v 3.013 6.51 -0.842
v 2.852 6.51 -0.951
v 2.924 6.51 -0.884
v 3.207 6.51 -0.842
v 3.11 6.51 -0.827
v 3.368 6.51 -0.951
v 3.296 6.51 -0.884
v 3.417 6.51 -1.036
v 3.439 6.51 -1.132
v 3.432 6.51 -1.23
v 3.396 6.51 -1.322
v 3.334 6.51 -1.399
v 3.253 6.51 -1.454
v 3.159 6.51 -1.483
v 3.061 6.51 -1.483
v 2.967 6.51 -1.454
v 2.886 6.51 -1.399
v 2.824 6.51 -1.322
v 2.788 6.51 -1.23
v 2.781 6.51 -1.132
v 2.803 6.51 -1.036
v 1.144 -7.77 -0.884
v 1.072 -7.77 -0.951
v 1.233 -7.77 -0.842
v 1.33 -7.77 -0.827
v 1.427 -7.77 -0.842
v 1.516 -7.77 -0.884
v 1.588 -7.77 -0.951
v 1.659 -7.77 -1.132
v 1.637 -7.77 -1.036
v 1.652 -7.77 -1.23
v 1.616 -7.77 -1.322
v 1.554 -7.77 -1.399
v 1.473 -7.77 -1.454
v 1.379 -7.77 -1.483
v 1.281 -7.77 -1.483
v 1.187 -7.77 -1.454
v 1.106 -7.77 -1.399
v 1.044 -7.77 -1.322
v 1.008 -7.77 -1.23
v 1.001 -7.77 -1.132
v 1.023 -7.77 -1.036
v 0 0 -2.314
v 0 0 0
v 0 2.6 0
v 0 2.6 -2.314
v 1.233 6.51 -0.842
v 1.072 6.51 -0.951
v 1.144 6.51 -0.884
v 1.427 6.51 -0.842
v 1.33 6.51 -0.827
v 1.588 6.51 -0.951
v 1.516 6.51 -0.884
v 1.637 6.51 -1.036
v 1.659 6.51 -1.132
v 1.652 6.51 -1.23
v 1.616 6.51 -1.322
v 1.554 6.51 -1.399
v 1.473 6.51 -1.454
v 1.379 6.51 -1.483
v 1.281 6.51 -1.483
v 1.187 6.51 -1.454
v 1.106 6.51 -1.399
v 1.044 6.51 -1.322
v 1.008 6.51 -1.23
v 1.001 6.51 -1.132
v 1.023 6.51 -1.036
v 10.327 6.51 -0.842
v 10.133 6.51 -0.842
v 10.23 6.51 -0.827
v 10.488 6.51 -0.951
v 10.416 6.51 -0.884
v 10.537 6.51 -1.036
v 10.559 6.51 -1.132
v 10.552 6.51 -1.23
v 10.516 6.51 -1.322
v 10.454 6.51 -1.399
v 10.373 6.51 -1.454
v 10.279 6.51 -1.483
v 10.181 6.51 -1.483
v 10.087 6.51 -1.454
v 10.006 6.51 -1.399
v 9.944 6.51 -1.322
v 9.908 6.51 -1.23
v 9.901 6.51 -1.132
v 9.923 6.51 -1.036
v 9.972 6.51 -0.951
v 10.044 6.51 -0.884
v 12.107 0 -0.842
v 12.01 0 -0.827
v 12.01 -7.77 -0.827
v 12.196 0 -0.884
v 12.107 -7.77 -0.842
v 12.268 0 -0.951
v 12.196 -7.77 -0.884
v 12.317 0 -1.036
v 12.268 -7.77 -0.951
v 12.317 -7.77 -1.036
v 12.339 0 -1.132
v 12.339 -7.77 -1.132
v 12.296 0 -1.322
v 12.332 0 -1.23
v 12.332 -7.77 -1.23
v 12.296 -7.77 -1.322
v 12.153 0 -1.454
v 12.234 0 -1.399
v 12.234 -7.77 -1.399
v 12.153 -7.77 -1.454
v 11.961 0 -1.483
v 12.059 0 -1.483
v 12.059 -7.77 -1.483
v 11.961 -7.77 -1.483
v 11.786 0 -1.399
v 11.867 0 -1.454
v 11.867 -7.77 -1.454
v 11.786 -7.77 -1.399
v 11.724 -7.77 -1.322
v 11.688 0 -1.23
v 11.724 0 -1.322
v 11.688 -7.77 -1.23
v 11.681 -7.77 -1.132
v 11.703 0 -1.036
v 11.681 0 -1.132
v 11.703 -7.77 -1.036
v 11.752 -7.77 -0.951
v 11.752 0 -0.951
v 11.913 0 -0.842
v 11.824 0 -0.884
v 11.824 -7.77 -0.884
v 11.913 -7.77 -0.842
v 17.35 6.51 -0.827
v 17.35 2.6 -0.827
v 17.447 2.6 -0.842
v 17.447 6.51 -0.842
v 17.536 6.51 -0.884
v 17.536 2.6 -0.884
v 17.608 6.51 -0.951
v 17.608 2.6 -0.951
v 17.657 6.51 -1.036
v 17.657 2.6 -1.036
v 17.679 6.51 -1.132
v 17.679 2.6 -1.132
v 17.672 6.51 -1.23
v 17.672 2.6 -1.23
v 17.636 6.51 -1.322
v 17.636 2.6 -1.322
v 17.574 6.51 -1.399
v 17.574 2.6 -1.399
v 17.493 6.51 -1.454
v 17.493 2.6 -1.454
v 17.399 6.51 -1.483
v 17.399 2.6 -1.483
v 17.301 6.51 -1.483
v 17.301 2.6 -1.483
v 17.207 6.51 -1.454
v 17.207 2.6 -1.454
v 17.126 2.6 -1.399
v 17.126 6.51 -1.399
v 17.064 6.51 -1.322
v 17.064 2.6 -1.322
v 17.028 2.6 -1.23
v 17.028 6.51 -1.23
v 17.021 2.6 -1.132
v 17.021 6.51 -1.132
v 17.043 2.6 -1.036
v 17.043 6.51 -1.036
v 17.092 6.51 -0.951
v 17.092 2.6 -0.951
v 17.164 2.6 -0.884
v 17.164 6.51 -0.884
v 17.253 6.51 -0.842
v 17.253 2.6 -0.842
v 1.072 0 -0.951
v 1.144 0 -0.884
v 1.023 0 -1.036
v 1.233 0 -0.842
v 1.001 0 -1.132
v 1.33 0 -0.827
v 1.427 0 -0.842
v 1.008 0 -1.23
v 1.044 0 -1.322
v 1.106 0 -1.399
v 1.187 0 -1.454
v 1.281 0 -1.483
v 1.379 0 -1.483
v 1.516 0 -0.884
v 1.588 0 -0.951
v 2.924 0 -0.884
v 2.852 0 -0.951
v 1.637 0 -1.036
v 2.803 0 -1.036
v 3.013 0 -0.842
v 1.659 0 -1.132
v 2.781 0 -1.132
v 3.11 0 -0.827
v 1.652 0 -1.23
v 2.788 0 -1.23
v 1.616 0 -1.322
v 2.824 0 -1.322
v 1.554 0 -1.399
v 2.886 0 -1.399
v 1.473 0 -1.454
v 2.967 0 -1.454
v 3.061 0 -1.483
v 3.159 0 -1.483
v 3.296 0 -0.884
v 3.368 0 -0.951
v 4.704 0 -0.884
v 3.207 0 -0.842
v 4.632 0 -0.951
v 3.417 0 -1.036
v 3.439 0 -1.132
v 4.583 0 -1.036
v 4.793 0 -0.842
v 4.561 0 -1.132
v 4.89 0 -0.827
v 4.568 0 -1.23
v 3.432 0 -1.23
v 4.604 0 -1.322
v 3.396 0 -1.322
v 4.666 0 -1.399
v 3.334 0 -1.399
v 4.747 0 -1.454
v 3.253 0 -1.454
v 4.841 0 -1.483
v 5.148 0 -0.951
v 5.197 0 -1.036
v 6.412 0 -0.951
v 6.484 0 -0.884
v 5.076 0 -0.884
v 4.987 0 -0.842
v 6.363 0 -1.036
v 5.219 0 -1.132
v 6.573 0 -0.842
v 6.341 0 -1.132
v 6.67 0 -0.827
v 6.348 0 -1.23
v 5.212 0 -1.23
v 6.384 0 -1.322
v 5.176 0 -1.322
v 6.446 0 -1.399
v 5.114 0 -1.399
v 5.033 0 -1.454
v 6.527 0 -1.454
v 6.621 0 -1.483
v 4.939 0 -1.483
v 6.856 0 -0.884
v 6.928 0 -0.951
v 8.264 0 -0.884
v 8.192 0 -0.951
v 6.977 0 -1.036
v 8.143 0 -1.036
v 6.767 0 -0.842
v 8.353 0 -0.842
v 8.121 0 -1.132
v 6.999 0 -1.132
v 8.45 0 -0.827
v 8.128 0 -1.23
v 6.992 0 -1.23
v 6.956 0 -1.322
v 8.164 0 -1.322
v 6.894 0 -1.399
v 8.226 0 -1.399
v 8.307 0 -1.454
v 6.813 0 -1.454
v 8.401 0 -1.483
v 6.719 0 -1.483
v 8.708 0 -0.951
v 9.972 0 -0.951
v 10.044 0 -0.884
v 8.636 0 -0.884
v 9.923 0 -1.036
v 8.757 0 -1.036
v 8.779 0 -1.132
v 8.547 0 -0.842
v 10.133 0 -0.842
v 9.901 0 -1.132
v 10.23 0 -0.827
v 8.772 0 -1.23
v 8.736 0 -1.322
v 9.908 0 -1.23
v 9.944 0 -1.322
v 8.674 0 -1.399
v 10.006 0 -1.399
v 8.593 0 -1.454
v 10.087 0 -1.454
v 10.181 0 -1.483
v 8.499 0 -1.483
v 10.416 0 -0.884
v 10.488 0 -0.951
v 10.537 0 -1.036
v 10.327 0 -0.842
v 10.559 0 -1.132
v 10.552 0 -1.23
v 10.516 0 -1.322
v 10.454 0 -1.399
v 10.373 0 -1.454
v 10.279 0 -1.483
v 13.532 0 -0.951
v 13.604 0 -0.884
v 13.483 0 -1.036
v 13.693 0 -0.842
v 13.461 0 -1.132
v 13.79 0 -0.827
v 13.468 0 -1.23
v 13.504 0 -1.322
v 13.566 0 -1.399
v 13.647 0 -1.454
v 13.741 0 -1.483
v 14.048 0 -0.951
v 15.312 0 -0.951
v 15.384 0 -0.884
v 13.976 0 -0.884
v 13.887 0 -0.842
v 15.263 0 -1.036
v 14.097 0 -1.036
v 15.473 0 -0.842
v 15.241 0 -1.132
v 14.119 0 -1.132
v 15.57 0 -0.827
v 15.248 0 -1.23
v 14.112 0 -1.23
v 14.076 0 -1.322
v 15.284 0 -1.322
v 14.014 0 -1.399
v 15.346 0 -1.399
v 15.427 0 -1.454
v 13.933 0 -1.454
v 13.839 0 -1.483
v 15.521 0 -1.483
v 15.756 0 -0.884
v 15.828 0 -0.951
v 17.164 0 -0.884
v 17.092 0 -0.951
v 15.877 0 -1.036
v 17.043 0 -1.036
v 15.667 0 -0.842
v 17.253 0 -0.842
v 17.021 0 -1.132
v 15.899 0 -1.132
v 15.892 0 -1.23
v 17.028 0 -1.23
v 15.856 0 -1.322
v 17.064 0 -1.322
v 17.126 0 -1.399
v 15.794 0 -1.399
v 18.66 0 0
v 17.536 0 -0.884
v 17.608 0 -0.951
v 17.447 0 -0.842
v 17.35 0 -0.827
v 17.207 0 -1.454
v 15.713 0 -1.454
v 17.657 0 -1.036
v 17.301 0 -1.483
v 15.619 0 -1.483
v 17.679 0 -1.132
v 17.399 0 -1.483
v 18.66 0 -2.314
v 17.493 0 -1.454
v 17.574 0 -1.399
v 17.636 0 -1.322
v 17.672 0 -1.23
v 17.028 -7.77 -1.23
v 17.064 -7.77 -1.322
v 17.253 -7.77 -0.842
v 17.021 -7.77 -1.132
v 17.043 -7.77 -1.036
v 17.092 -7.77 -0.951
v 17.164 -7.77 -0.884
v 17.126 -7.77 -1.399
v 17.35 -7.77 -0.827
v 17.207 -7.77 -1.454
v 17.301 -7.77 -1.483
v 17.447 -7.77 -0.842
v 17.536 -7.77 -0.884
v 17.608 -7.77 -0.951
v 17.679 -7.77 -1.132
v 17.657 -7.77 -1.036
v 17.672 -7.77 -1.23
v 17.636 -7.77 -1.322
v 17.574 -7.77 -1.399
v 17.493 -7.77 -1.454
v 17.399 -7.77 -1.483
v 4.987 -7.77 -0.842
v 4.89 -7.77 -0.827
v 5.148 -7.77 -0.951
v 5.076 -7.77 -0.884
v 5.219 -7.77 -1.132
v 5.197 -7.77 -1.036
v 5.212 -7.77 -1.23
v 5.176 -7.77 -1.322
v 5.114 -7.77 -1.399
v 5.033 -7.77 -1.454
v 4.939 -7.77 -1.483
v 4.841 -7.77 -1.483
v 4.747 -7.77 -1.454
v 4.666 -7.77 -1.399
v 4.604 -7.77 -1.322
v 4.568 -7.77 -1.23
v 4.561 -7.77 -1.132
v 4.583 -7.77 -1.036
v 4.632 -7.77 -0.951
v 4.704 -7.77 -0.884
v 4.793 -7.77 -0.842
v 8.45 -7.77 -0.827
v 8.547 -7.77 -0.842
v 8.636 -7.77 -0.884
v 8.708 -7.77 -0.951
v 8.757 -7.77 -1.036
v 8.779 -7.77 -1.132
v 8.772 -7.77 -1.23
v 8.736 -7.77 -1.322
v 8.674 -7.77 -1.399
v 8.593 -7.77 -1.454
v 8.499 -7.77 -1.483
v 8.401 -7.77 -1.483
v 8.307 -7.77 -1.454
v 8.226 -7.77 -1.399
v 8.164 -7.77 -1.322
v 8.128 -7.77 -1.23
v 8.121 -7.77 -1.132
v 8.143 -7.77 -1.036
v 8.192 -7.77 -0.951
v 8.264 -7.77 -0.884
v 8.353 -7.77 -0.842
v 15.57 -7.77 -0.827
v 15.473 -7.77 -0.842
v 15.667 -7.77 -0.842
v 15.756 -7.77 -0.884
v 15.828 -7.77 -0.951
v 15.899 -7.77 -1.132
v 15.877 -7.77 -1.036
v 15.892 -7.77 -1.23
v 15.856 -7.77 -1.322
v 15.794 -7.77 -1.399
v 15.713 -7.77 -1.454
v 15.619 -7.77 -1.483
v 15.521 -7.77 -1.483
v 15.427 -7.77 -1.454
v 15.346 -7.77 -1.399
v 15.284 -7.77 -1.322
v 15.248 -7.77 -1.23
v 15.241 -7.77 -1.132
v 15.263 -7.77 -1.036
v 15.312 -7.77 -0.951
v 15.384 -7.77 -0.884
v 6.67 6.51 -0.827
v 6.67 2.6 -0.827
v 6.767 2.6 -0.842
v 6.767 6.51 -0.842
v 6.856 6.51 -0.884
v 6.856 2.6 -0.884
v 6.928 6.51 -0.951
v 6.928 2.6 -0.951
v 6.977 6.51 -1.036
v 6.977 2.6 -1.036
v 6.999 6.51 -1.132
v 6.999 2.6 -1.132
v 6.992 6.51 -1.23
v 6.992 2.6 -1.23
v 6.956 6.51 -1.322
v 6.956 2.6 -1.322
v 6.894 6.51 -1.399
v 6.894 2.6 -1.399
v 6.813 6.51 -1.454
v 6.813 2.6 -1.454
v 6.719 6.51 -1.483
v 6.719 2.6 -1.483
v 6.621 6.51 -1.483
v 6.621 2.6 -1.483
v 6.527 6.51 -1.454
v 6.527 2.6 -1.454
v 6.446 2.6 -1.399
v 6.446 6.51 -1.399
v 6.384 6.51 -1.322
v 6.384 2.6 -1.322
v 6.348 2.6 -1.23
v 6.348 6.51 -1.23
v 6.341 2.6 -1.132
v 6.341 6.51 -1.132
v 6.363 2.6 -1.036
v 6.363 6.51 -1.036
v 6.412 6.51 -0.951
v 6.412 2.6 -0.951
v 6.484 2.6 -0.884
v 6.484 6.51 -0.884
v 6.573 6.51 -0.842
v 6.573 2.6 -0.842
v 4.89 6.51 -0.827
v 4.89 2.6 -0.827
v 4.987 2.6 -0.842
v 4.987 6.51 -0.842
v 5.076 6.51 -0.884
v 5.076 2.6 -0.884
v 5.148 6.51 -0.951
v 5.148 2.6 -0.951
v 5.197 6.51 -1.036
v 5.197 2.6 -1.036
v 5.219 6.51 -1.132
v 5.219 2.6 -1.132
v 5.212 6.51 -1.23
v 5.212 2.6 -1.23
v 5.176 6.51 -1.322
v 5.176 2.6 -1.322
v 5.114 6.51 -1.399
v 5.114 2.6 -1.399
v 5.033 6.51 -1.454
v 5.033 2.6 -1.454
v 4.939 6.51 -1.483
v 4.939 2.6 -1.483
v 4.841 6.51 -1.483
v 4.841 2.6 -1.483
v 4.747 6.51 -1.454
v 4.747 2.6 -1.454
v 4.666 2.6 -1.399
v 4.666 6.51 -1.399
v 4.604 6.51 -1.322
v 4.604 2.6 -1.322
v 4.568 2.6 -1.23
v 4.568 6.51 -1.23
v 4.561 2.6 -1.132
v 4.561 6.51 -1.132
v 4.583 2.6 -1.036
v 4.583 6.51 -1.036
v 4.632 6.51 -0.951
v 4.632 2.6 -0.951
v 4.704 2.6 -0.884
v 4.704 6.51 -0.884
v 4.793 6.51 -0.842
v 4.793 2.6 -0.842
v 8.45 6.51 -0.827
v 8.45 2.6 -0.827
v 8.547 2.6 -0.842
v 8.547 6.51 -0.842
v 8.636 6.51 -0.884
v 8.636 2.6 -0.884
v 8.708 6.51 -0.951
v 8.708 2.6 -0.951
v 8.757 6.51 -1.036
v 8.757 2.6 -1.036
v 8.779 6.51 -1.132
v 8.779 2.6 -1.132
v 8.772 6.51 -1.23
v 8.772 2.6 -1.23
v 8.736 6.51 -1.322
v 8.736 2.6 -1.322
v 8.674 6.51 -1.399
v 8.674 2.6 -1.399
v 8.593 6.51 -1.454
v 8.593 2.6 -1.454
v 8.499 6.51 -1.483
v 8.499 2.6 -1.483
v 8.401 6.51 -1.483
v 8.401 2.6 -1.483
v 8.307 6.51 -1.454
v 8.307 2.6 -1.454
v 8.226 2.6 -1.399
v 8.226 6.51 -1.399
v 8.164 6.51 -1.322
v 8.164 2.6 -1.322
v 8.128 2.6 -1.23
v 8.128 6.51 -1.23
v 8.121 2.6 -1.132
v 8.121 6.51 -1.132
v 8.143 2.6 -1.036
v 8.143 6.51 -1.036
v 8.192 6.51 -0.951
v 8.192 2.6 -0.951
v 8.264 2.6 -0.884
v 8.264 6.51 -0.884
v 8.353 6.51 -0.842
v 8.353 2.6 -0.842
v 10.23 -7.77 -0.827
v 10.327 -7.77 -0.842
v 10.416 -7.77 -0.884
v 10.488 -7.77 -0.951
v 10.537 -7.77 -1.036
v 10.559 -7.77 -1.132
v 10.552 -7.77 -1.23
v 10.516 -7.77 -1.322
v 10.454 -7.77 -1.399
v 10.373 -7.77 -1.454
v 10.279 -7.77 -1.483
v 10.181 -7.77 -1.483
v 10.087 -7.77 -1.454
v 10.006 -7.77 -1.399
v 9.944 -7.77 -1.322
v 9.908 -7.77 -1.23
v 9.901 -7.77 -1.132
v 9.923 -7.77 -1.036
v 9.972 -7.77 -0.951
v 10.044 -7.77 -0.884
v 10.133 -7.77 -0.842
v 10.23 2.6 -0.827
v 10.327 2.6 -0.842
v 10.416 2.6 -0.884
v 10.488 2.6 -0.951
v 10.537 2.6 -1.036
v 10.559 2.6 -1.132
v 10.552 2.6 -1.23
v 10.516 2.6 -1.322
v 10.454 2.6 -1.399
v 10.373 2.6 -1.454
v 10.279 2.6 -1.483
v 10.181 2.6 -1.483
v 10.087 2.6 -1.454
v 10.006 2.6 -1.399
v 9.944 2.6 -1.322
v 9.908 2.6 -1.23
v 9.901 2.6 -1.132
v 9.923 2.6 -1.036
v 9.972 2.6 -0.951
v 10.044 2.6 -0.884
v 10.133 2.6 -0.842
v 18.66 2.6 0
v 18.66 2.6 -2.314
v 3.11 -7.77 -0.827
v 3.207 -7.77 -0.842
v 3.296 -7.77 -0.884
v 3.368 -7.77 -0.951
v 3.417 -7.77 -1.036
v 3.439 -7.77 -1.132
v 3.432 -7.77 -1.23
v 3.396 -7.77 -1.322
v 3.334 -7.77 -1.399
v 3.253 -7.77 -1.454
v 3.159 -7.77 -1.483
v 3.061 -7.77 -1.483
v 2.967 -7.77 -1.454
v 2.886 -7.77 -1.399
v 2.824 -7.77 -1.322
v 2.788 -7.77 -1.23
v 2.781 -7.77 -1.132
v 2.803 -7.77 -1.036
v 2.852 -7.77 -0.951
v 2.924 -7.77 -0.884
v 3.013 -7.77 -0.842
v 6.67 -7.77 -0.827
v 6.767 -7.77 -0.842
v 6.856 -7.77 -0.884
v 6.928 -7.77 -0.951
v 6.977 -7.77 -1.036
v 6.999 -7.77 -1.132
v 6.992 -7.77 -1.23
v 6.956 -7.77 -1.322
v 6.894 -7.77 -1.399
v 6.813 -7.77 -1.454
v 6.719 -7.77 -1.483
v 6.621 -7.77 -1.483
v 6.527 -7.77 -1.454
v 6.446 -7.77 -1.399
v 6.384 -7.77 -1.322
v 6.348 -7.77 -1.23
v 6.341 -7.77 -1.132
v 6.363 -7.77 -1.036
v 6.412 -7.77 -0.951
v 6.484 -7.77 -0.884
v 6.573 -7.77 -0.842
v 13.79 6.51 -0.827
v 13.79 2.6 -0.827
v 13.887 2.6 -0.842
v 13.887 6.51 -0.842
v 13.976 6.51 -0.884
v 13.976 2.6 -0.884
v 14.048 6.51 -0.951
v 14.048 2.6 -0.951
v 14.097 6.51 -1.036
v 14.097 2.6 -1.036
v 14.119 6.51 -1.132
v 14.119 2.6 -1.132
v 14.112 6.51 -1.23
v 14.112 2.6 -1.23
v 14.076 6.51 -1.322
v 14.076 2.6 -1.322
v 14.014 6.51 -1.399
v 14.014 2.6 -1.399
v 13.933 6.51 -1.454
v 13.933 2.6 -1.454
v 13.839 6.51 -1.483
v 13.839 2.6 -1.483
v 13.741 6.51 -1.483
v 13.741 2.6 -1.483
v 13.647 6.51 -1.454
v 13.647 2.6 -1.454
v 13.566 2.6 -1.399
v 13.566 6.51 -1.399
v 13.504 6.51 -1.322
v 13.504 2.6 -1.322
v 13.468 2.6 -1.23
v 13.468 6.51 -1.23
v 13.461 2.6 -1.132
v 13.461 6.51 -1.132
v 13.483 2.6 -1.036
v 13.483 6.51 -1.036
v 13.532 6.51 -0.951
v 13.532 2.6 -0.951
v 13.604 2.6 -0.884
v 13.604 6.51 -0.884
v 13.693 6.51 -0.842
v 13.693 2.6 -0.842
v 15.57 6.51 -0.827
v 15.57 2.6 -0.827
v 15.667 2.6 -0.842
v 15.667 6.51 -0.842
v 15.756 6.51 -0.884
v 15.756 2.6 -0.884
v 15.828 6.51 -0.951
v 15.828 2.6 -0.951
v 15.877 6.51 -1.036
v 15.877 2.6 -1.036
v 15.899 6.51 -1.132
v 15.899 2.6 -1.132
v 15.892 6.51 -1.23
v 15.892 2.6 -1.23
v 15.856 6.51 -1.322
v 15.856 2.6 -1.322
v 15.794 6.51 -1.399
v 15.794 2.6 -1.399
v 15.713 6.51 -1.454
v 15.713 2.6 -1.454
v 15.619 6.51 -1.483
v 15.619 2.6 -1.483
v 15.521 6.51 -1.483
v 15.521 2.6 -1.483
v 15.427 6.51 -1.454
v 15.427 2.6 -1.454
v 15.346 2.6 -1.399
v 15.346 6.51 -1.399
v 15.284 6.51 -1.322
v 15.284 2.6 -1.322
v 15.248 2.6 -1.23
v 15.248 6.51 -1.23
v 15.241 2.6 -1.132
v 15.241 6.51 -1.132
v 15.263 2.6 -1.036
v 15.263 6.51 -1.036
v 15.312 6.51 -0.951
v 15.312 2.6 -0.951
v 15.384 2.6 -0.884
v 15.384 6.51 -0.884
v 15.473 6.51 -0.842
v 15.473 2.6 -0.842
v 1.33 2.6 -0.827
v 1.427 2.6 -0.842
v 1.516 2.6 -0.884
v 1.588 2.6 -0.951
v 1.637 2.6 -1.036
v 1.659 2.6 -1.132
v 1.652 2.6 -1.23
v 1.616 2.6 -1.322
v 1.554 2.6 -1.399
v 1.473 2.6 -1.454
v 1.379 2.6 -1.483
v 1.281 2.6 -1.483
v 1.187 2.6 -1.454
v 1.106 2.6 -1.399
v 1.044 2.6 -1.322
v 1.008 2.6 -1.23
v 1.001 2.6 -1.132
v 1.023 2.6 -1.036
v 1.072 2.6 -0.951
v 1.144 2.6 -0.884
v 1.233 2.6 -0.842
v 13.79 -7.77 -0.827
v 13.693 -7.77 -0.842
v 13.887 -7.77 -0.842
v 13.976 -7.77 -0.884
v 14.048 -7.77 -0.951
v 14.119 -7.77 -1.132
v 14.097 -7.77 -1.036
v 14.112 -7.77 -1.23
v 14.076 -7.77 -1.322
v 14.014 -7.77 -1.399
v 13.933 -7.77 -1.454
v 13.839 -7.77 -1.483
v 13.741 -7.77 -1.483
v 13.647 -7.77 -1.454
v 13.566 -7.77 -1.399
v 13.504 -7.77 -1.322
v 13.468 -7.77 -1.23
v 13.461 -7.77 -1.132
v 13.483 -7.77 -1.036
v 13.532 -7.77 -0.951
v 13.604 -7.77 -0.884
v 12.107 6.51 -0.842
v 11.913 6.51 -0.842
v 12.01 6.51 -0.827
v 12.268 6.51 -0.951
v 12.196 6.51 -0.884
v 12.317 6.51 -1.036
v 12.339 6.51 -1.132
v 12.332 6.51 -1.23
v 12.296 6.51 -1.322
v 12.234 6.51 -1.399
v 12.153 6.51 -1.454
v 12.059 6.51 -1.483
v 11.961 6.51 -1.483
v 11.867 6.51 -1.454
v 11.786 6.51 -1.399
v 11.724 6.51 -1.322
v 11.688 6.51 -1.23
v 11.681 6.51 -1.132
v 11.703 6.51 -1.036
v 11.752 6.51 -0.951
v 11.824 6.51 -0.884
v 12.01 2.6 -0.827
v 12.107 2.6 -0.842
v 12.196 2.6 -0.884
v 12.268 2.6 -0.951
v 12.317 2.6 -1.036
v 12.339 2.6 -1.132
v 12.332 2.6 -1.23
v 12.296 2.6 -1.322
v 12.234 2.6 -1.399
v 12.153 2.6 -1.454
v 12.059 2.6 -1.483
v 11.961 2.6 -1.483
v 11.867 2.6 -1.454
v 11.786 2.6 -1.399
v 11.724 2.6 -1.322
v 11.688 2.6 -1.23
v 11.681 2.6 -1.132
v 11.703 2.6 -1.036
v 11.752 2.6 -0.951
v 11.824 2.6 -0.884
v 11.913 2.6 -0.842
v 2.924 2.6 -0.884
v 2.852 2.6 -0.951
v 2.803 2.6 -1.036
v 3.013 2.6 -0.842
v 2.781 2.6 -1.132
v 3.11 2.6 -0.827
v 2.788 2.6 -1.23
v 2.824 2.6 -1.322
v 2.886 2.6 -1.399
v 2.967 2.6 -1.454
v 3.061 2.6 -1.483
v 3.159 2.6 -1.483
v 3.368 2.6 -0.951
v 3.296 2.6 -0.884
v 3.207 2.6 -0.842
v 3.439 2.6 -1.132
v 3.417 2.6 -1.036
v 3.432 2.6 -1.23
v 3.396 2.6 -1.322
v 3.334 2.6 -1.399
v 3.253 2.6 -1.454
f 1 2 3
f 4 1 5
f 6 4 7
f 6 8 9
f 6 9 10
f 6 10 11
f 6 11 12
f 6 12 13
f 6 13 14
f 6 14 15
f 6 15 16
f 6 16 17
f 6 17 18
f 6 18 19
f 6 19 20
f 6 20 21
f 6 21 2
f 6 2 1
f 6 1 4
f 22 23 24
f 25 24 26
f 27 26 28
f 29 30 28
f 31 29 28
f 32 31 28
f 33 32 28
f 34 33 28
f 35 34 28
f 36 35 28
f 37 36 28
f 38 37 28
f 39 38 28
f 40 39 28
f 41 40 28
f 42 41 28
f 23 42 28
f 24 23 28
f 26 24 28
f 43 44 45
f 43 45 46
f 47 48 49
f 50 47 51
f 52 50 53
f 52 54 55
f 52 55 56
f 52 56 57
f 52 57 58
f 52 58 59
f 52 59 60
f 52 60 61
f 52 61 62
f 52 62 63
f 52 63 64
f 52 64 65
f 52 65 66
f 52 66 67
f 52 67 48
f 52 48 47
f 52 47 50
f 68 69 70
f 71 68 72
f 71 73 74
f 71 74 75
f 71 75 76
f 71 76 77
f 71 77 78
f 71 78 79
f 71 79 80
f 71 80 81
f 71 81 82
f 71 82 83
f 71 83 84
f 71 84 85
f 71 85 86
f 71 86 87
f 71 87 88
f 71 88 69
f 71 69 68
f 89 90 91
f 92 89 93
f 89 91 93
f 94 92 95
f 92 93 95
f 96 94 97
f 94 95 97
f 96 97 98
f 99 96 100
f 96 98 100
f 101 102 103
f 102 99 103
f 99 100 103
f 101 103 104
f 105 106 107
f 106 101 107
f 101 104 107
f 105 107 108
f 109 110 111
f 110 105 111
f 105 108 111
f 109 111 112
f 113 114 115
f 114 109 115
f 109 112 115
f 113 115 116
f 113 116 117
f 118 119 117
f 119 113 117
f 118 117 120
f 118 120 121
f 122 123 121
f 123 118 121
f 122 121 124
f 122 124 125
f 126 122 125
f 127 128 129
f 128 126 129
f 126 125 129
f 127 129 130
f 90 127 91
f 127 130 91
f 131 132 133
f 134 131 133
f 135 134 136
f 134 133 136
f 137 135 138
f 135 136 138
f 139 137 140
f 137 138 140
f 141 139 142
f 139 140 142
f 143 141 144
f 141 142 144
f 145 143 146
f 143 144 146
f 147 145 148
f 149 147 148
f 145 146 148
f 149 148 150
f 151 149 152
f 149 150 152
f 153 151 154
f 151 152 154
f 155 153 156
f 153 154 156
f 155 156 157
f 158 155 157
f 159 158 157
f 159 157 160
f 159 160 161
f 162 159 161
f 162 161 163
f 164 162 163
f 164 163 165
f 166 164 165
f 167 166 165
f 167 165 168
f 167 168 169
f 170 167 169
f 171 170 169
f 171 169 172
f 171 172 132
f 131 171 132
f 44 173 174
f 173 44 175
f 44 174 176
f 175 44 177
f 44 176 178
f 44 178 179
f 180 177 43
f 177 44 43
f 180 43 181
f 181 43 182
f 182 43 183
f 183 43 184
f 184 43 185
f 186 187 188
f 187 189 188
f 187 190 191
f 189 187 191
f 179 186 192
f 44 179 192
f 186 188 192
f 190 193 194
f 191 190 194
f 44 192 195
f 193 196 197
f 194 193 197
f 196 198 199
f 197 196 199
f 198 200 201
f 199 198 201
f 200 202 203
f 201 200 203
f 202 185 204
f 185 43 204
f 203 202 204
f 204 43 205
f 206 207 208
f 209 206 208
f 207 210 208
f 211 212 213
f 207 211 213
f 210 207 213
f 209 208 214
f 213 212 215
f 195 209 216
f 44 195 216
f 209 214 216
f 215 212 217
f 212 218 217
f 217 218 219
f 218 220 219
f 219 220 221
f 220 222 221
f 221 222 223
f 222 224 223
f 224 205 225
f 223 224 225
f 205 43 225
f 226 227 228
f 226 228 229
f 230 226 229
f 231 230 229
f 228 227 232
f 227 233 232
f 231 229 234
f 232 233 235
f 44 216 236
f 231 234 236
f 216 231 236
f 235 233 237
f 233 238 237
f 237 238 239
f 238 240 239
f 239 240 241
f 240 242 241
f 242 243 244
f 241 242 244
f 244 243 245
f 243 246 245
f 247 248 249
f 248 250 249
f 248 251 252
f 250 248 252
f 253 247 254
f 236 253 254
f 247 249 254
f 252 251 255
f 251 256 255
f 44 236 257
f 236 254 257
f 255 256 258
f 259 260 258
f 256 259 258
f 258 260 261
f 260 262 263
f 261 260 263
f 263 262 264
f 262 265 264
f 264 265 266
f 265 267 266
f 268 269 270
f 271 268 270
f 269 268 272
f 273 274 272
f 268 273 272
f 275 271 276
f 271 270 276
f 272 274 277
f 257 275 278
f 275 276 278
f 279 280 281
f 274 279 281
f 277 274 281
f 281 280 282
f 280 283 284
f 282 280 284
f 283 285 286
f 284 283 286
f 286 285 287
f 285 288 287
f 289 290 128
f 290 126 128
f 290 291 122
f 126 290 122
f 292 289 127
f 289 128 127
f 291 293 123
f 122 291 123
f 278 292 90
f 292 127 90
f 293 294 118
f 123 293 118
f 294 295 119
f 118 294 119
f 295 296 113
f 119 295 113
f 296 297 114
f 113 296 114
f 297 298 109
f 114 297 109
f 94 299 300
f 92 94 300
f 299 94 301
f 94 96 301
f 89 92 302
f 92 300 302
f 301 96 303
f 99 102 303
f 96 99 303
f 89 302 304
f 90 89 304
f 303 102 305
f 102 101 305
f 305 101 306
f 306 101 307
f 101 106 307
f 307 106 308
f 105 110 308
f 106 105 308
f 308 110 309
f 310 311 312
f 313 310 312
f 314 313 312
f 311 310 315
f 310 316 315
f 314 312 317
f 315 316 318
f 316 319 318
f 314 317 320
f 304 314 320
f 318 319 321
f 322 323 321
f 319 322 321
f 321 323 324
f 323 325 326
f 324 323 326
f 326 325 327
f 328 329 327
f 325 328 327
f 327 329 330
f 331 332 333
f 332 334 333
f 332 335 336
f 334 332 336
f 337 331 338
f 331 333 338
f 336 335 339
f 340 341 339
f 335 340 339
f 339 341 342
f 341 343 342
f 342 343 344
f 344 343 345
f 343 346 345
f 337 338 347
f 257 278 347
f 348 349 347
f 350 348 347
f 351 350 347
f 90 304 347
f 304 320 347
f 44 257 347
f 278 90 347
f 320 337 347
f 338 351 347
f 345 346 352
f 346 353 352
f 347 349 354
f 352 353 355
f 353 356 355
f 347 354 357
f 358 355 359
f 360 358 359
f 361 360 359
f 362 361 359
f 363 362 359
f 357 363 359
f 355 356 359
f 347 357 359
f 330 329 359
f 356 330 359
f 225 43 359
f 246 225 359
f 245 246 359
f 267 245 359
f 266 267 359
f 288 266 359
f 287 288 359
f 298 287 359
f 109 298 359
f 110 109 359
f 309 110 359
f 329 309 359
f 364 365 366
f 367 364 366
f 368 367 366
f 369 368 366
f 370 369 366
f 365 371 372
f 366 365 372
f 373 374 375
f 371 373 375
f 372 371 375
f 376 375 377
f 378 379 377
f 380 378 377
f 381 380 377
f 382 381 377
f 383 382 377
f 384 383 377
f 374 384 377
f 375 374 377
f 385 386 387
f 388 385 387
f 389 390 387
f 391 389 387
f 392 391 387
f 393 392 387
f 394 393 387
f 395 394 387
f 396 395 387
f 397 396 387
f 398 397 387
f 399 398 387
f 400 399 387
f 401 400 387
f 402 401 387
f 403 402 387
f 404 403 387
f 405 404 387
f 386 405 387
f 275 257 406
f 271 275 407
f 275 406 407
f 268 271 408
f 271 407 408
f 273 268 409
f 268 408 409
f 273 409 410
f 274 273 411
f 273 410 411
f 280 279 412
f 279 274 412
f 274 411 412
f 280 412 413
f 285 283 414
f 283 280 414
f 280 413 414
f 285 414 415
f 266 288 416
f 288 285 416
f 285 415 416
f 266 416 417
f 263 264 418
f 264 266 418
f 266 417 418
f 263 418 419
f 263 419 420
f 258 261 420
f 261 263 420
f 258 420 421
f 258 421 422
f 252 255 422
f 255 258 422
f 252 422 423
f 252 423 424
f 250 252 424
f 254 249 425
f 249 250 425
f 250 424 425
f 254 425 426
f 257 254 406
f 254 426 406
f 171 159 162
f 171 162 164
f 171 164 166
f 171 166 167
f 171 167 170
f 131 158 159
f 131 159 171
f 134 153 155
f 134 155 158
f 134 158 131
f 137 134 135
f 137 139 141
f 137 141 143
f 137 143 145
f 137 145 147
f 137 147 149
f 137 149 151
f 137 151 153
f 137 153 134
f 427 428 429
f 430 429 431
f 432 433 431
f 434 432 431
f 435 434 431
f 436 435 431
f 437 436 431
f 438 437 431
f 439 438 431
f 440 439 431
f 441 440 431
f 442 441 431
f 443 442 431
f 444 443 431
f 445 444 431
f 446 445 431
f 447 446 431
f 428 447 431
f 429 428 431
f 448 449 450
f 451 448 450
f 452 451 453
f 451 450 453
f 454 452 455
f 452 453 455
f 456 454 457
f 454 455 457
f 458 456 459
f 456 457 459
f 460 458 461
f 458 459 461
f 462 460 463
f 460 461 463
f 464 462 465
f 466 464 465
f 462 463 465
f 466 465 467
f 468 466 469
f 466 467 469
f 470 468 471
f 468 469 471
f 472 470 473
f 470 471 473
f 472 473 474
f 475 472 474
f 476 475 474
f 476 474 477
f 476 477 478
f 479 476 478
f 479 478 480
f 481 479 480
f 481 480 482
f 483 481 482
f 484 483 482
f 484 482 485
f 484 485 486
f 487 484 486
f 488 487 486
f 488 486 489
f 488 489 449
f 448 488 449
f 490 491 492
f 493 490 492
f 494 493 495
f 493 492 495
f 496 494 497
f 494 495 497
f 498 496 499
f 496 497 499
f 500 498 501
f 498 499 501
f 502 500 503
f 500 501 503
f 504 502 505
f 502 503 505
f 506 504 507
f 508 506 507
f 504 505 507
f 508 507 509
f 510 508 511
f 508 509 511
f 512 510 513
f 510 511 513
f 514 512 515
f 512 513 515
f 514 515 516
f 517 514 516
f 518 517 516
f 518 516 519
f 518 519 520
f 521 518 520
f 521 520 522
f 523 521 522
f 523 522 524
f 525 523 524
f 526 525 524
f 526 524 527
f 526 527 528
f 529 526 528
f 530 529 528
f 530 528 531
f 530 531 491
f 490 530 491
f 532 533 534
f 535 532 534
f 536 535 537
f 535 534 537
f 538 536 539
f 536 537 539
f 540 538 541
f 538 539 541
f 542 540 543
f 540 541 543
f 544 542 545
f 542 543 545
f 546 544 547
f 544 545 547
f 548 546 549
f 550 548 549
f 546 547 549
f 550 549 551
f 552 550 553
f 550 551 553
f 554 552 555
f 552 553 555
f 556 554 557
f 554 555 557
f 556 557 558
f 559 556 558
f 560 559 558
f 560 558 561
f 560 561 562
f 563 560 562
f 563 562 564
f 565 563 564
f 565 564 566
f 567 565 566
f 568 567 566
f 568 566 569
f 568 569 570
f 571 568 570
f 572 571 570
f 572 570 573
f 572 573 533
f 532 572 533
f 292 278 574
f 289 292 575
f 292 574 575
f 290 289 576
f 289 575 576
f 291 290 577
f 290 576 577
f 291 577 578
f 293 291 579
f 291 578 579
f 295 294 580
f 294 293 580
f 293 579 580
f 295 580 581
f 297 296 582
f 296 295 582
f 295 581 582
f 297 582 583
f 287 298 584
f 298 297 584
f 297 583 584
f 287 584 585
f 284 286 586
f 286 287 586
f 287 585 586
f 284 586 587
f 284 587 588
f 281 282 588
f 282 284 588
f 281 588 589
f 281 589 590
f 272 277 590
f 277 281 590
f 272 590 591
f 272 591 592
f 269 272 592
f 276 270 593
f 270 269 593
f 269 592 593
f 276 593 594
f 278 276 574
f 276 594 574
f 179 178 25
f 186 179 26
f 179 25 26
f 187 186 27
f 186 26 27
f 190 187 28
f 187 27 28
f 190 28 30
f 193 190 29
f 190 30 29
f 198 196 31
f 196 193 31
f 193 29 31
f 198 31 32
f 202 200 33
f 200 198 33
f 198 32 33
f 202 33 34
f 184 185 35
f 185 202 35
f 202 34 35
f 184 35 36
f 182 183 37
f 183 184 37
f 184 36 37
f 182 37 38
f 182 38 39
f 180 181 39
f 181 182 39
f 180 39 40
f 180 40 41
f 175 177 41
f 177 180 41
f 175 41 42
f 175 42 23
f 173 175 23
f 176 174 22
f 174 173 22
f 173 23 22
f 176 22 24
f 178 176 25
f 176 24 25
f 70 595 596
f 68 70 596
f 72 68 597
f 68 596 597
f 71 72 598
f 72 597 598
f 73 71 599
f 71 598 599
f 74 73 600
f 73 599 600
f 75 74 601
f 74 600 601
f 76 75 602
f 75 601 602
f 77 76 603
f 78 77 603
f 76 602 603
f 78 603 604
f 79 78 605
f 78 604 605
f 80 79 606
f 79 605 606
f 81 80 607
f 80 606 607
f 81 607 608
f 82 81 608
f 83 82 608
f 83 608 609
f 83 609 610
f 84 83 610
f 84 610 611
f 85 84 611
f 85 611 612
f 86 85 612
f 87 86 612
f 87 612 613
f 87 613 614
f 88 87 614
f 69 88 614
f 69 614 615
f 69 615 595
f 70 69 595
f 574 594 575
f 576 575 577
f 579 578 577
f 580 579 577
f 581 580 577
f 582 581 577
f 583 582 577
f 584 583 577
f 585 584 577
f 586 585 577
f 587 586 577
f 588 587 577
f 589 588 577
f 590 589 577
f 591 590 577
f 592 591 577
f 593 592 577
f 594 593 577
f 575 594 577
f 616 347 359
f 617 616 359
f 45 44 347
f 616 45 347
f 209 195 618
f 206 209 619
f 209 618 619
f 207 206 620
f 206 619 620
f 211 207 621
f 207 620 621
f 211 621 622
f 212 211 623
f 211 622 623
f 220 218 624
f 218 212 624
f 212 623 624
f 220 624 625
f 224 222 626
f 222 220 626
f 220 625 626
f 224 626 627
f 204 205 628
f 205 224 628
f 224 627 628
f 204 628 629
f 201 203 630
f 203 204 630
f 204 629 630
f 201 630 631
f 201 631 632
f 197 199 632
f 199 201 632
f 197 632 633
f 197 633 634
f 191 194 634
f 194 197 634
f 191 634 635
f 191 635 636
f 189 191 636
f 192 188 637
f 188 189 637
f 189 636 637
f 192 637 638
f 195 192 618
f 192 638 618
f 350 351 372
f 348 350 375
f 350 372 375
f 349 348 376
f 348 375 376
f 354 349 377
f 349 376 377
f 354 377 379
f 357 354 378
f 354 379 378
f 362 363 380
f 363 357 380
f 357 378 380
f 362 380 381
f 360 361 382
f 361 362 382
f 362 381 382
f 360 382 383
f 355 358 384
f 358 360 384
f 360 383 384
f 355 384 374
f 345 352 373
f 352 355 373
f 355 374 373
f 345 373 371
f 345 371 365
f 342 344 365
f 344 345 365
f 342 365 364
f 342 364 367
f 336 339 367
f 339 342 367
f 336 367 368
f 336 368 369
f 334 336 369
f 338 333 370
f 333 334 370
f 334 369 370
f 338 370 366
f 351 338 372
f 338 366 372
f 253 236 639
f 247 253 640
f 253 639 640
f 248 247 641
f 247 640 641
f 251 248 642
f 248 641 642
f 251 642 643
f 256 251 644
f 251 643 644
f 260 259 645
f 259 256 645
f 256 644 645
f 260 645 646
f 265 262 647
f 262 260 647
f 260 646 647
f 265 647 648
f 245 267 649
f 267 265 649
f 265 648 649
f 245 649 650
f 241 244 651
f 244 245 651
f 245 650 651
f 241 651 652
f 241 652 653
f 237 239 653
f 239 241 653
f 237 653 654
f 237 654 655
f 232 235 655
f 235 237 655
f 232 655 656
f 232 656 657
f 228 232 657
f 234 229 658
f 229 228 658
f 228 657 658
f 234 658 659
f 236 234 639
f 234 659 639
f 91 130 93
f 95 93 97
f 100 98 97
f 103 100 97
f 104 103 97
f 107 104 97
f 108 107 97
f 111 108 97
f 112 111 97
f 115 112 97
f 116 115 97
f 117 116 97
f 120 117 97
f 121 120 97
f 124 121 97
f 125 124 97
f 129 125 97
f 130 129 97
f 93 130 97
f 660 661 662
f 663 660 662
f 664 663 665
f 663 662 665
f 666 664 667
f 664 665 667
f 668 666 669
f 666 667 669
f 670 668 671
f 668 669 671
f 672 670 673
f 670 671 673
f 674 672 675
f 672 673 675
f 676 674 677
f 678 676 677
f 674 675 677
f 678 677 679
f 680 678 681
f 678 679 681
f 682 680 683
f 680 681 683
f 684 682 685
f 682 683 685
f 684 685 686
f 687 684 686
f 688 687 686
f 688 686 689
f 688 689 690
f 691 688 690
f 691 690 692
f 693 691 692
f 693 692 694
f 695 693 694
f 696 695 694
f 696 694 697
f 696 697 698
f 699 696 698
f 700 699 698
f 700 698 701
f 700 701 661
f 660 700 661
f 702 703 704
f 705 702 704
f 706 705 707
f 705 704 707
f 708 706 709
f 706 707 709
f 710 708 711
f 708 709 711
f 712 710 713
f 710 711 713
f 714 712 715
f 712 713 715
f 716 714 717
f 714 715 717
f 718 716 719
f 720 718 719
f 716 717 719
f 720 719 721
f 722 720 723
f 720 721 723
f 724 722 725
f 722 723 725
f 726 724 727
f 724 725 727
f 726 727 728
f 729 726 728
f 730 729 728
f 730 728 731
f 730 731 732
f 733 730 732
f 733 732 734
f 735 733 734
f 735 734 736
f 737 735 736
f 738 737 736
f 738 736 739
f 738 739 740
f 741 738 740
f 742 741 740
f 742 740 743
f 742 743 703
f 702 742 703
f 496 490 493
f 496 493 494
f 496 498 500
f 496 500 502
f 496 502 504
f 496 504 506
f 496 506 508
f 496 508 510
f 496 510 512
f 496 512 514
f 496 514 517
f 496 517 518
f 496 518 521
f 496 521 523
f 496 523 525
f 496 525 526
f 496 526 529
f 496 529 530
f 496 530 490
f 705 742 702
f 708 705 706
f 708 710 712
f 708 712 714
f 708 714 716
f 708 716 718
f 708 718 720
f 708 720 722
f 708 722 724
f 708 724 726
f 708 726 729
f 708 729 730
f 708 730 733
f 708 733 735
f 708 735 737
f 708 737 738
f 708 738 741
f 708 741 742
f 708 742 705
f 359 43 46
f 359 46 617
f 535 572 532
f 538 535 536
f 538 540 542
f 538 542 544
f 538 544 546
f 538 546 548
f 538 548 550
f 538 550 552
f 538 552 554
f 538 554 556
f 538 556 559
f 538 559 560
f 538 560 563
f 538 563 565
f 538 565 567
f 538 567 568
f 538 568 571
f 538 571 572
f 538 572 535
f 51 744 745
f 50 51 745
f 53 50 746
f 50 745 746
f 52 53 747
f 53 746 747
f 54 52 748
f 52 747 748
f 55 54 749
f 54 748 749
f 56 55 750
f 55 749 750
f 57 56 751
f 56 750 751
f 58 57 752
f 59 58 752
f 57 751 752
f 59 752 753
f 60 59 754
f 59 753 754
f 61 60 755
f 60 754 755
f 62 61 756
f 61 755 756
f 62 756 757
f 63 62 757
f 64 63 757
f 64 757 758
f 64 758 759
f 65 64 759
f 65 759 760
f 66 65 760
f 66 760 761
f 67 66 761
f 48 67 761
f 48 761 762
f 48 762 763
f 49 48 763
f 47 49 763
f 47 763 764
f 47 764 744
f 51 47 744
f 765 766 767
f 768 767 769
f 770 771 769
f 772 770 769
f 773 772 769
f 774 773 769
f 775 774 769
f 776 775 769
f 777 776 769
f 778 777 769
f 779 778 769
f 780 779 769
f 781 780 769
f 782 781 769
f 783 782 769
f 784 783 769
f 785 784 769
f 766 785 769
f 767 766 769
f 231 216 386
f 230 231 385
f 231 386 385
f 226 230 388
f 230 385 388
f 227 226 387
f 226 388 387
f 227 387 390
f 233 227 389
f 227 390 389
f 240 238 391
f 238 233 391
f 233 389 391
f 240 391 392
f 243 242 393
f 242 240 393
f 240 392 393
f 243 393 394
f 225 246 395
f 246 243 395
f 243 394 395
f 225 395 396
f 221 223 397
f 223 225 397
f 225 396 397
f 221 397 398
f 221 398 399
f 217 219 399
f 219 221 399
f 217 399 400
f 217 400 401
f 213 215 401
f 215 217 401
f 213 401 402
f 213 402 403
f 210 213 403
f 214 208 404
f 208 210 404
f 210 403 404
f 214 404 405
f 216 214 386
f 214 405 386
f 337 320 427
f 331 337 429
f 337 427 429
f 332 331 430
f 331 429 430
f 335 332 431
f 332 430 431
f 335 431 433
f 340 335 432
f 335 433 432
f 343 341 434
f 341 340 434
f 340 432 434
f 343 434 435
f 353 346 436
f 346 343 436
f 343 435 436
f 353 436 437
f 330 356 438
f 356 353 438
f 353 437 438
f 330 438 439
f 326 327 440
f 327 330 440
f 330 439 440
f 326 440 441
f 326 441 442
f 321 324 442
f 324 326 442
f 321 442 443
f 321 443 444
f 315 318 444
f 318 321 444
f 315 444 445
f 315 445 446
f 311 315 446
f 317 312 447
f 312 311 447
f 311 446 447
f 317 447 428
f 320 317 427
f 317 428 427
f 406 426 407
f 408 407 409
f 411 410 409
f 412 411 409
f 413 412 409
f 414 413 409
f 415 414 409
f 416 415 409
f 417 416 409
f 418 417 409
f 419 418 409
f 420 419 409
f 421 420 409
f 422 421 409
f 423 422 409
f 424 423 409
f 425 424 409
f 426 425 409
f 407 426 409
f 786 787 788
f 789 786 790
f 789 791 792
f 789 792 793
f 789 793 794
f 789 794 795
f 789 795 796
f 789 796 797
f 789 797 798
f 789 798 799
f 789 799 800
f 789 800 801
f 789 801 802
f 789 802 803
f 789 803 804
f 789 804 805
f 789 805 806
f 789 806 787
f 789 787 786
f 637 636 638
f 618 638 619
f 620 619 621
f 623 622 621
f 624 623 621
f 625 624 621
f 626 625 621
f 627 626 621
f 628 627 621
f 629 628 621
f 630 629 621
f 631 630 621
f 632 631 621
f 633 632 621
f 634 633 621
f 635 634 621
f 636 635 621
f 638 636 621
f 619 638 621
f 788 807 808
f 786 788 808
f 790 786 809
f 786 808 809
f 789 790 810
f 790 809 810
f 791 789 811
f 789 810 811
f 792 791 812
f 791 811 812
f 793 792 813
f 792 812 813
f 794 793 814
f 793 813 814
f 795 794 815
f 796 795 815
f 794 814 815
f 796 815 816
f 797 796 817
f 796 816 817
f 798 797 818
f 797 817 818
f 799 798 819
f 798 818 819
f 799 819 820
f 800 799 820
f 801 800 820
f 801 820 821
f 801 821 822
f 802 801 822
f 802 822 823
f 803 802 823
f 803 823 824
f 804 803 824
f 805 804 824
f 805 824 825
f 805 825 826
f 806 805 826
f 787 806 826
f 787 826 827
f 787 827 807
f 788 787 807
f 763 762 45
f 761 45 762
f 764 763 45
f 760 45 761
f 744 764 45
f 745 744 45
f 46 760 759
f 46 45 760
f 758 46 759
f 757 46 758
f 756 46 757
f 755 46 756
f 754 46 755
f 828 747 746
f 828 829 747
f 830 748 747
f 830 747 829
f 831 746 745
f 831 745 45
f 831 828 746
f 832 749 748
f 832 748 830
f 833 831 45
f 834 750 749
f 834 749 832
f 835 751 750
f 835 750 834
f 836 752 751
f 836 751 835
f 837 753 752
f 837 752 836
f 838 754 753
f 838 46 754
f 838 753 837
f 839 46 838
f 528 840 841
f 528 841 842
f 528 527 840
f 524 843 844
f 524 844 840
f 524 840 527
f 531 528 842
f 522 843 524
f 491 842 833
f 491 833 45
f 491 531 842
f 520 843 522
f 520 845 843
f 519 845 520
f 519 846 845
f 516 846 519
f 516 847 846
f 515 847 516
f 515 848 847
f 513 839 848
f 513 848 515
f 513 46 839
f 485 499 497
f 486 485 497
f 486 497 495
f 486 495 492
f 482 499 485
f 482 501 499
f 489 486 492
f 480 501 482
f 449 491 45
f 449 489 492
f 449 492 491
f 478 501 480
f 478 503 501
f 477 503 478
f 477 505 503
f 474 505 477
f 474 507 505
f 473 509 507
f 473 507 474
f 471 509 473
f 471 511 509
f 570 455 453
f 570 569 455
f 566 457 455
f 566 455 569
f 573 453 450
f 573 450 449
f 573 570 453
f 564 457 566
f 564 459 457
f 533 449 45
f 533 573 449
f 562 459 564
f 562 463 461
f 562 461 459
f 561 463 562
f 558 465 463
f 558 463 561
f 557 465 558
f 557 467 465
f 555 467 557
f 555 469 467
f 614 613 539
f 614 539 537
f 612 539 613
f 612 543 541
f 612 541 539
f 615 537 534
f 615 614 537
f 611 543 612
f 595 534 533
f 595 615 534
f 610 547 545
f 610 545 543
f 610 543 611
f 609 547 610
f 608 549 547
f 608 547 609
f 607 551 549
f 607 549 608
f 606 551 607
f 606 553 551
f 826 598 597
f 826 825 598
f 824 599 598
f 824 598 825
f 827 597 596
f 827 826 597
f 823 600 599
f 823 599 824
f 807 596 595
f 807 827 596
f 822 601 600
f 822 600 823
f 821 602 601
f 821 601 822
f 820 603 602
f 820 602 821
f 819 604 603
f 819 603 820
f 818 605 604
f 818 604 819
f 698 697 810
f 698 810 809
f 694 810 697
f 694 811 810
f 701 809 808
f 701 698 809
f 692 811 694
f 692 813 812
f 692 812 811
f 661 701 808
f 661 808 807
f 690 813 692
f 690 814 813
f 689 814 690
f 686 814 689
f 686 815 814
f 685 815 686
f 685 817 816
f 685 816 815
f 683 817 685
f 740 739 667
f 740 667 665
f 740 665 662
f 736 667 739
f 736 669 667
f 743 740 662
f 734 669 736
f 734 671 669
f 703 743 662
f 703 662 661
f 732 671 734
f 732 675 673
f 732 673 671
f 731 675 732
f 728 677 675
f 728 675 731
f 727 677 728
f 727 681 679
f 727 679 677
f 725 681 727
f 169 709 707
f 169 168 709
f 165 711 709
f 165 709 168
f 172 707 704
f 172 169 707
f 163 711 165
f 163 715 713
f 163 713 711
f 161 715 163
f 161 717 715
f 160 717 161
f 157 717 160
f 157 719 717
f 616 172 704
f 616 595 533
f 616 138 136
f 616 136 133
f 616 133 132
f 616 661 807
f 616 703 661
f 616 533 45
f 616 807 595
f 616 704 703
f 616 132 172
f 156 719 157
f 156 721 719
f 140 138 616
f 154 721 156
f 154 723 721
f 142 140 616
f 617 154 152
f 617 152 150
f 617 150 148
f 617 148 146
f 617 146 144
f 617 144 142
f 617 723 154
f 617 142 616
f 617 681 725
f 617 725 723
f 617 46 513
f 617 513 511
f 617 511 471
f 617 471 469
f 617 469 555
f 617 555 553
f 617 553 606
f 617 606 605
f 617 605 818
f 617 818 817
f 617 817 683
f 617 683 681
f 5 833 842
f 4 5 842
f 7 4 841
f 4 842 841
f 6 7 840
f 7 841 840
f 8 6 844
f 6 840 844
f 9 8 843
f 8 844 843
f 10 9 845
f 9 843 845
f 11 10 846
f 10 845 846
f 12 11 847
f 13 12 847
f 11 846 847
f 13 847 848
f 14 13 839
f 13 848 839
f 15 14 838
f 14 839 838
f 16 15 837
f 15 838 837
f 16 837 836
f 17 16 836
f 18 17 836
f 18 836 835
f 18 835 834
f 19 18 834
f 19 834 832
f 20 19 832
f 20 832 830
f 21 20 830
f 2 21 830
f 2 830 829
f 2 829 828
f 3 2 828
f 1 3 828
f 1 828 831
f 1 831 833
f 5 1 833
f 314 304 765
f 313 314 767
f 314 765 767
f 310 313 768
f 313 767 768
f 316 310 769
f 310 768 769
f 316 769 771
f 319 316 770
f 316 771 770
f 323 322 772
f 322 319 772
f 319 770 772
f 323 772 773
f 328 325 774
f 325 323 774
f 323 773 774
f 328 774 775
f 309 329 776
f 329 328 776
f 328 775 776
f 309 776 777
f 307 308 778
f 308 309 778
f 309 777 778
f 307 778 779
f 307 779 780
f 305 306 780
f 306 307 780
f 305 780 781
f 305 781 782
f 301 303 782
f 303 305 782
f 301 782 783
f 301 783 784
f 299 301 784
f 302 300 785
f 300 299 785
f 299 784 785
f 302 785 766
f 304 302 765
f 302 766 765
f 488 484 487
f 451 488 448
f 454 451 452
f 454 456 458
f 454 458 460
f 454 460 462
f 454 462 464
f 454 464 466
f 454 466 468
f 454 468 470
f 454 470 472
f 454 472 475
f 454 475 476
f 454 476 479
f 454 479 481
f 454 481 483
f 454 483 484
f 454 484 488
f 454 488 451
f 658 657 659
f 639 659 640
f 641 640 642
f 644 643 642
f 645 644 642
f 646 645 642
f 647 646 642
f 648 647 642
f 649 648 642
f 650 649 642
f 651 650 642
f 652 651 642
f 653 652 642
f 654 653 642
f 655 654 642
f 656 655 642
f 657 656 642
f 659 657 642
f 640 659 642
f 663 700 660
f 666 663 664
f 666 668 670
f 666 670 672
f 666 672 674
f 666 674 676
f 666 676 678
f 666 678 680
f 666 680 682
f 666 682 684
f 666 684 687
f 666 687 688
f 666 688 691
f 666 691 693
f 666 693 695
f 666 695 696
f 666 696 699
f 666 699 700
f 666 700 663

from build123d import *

# Parameters (mm, degrees)
SKETCH1_W                = 18.66
SKETCH1_H                = 2.314
BOSS_EXTRUDE1_DEPTH      = 2.6
BOSS_EXTRUDE2_DEPTH      = 3.91
BOSS_EXTRUDE2_DEPTH_BACK = 10.37
SKETCH2_R                = 0.33


with BuildPart() as part:
    # Sketch1 → Boss-Extrude1 (new body)
    with BuildSketch(Plane(origin=(0, 0, 0), x_dir=(1, 0, 0), z_dir=(0, 1, 0))):
        with Locations((9.33, 1.157)):
            Rectangle(SKETCH1_W, SKETCH1_H)
    extrude(amount=BOSS_EXTRUDE1_DEPTH)

    # Sketch2 → Boss-Extrude2 (add, two sides: drawn at the far end of the back side and taken through both)
    with BuildSketch(Plane(origin=(0, 2.6, 0), x_dir=(1, 0, 0), z_dir=(0, 1, 0)).offset(-BOSS_EXTRUDE2_DEPTH_BACK)):
        with Locations(Location((1.33, 1.157, 0), (0, 0, 270))):
            Circle(SKETCH2_R)
        with Locations(Location((3.11, 1.157, 0), (0, 0, 270))):
            Circle(SKETCH2_R)
        with Locations(Location((4.89, 1.157, 0), (0, 0, 270))):
            Circle(SKETCH2_R)
        with Locations(Location((6.67, 1.157, 0), (0, 0, 270))):
            Circle(SKETCH2_R)
        with Locations(Location((8.45, 1.157, 0), (0, 0, 270))):
            Circle(SKETCH2_R)
        with Locations(Location((10.23, 1.157, 0), (0, 0, 270))):
            Circle(SKETCH2_R)
        with Locations(Location((12.01, 1.157, 0), (0, 0, 270))):
            Circle(SKETCH2_R)
        with Locations(Location((13.79, 1.157, 0), (0, 0, 270))):
            Circle(SKETCH2_R)
        with Locations(Location((15.57, 1.157, 0), (0, 0, 270))):
            Circle(SKETCH2_R)
        with Locations(Location((17.35, 1.157, 0), (0, 0, 270))):
            Circle(SKETCH2_R)
    extrude(amount=BOSS_EXTRUDE2_DEPTH + BOSS_EXTRUDE2_DEPTH_BACK)


solid = part.part
